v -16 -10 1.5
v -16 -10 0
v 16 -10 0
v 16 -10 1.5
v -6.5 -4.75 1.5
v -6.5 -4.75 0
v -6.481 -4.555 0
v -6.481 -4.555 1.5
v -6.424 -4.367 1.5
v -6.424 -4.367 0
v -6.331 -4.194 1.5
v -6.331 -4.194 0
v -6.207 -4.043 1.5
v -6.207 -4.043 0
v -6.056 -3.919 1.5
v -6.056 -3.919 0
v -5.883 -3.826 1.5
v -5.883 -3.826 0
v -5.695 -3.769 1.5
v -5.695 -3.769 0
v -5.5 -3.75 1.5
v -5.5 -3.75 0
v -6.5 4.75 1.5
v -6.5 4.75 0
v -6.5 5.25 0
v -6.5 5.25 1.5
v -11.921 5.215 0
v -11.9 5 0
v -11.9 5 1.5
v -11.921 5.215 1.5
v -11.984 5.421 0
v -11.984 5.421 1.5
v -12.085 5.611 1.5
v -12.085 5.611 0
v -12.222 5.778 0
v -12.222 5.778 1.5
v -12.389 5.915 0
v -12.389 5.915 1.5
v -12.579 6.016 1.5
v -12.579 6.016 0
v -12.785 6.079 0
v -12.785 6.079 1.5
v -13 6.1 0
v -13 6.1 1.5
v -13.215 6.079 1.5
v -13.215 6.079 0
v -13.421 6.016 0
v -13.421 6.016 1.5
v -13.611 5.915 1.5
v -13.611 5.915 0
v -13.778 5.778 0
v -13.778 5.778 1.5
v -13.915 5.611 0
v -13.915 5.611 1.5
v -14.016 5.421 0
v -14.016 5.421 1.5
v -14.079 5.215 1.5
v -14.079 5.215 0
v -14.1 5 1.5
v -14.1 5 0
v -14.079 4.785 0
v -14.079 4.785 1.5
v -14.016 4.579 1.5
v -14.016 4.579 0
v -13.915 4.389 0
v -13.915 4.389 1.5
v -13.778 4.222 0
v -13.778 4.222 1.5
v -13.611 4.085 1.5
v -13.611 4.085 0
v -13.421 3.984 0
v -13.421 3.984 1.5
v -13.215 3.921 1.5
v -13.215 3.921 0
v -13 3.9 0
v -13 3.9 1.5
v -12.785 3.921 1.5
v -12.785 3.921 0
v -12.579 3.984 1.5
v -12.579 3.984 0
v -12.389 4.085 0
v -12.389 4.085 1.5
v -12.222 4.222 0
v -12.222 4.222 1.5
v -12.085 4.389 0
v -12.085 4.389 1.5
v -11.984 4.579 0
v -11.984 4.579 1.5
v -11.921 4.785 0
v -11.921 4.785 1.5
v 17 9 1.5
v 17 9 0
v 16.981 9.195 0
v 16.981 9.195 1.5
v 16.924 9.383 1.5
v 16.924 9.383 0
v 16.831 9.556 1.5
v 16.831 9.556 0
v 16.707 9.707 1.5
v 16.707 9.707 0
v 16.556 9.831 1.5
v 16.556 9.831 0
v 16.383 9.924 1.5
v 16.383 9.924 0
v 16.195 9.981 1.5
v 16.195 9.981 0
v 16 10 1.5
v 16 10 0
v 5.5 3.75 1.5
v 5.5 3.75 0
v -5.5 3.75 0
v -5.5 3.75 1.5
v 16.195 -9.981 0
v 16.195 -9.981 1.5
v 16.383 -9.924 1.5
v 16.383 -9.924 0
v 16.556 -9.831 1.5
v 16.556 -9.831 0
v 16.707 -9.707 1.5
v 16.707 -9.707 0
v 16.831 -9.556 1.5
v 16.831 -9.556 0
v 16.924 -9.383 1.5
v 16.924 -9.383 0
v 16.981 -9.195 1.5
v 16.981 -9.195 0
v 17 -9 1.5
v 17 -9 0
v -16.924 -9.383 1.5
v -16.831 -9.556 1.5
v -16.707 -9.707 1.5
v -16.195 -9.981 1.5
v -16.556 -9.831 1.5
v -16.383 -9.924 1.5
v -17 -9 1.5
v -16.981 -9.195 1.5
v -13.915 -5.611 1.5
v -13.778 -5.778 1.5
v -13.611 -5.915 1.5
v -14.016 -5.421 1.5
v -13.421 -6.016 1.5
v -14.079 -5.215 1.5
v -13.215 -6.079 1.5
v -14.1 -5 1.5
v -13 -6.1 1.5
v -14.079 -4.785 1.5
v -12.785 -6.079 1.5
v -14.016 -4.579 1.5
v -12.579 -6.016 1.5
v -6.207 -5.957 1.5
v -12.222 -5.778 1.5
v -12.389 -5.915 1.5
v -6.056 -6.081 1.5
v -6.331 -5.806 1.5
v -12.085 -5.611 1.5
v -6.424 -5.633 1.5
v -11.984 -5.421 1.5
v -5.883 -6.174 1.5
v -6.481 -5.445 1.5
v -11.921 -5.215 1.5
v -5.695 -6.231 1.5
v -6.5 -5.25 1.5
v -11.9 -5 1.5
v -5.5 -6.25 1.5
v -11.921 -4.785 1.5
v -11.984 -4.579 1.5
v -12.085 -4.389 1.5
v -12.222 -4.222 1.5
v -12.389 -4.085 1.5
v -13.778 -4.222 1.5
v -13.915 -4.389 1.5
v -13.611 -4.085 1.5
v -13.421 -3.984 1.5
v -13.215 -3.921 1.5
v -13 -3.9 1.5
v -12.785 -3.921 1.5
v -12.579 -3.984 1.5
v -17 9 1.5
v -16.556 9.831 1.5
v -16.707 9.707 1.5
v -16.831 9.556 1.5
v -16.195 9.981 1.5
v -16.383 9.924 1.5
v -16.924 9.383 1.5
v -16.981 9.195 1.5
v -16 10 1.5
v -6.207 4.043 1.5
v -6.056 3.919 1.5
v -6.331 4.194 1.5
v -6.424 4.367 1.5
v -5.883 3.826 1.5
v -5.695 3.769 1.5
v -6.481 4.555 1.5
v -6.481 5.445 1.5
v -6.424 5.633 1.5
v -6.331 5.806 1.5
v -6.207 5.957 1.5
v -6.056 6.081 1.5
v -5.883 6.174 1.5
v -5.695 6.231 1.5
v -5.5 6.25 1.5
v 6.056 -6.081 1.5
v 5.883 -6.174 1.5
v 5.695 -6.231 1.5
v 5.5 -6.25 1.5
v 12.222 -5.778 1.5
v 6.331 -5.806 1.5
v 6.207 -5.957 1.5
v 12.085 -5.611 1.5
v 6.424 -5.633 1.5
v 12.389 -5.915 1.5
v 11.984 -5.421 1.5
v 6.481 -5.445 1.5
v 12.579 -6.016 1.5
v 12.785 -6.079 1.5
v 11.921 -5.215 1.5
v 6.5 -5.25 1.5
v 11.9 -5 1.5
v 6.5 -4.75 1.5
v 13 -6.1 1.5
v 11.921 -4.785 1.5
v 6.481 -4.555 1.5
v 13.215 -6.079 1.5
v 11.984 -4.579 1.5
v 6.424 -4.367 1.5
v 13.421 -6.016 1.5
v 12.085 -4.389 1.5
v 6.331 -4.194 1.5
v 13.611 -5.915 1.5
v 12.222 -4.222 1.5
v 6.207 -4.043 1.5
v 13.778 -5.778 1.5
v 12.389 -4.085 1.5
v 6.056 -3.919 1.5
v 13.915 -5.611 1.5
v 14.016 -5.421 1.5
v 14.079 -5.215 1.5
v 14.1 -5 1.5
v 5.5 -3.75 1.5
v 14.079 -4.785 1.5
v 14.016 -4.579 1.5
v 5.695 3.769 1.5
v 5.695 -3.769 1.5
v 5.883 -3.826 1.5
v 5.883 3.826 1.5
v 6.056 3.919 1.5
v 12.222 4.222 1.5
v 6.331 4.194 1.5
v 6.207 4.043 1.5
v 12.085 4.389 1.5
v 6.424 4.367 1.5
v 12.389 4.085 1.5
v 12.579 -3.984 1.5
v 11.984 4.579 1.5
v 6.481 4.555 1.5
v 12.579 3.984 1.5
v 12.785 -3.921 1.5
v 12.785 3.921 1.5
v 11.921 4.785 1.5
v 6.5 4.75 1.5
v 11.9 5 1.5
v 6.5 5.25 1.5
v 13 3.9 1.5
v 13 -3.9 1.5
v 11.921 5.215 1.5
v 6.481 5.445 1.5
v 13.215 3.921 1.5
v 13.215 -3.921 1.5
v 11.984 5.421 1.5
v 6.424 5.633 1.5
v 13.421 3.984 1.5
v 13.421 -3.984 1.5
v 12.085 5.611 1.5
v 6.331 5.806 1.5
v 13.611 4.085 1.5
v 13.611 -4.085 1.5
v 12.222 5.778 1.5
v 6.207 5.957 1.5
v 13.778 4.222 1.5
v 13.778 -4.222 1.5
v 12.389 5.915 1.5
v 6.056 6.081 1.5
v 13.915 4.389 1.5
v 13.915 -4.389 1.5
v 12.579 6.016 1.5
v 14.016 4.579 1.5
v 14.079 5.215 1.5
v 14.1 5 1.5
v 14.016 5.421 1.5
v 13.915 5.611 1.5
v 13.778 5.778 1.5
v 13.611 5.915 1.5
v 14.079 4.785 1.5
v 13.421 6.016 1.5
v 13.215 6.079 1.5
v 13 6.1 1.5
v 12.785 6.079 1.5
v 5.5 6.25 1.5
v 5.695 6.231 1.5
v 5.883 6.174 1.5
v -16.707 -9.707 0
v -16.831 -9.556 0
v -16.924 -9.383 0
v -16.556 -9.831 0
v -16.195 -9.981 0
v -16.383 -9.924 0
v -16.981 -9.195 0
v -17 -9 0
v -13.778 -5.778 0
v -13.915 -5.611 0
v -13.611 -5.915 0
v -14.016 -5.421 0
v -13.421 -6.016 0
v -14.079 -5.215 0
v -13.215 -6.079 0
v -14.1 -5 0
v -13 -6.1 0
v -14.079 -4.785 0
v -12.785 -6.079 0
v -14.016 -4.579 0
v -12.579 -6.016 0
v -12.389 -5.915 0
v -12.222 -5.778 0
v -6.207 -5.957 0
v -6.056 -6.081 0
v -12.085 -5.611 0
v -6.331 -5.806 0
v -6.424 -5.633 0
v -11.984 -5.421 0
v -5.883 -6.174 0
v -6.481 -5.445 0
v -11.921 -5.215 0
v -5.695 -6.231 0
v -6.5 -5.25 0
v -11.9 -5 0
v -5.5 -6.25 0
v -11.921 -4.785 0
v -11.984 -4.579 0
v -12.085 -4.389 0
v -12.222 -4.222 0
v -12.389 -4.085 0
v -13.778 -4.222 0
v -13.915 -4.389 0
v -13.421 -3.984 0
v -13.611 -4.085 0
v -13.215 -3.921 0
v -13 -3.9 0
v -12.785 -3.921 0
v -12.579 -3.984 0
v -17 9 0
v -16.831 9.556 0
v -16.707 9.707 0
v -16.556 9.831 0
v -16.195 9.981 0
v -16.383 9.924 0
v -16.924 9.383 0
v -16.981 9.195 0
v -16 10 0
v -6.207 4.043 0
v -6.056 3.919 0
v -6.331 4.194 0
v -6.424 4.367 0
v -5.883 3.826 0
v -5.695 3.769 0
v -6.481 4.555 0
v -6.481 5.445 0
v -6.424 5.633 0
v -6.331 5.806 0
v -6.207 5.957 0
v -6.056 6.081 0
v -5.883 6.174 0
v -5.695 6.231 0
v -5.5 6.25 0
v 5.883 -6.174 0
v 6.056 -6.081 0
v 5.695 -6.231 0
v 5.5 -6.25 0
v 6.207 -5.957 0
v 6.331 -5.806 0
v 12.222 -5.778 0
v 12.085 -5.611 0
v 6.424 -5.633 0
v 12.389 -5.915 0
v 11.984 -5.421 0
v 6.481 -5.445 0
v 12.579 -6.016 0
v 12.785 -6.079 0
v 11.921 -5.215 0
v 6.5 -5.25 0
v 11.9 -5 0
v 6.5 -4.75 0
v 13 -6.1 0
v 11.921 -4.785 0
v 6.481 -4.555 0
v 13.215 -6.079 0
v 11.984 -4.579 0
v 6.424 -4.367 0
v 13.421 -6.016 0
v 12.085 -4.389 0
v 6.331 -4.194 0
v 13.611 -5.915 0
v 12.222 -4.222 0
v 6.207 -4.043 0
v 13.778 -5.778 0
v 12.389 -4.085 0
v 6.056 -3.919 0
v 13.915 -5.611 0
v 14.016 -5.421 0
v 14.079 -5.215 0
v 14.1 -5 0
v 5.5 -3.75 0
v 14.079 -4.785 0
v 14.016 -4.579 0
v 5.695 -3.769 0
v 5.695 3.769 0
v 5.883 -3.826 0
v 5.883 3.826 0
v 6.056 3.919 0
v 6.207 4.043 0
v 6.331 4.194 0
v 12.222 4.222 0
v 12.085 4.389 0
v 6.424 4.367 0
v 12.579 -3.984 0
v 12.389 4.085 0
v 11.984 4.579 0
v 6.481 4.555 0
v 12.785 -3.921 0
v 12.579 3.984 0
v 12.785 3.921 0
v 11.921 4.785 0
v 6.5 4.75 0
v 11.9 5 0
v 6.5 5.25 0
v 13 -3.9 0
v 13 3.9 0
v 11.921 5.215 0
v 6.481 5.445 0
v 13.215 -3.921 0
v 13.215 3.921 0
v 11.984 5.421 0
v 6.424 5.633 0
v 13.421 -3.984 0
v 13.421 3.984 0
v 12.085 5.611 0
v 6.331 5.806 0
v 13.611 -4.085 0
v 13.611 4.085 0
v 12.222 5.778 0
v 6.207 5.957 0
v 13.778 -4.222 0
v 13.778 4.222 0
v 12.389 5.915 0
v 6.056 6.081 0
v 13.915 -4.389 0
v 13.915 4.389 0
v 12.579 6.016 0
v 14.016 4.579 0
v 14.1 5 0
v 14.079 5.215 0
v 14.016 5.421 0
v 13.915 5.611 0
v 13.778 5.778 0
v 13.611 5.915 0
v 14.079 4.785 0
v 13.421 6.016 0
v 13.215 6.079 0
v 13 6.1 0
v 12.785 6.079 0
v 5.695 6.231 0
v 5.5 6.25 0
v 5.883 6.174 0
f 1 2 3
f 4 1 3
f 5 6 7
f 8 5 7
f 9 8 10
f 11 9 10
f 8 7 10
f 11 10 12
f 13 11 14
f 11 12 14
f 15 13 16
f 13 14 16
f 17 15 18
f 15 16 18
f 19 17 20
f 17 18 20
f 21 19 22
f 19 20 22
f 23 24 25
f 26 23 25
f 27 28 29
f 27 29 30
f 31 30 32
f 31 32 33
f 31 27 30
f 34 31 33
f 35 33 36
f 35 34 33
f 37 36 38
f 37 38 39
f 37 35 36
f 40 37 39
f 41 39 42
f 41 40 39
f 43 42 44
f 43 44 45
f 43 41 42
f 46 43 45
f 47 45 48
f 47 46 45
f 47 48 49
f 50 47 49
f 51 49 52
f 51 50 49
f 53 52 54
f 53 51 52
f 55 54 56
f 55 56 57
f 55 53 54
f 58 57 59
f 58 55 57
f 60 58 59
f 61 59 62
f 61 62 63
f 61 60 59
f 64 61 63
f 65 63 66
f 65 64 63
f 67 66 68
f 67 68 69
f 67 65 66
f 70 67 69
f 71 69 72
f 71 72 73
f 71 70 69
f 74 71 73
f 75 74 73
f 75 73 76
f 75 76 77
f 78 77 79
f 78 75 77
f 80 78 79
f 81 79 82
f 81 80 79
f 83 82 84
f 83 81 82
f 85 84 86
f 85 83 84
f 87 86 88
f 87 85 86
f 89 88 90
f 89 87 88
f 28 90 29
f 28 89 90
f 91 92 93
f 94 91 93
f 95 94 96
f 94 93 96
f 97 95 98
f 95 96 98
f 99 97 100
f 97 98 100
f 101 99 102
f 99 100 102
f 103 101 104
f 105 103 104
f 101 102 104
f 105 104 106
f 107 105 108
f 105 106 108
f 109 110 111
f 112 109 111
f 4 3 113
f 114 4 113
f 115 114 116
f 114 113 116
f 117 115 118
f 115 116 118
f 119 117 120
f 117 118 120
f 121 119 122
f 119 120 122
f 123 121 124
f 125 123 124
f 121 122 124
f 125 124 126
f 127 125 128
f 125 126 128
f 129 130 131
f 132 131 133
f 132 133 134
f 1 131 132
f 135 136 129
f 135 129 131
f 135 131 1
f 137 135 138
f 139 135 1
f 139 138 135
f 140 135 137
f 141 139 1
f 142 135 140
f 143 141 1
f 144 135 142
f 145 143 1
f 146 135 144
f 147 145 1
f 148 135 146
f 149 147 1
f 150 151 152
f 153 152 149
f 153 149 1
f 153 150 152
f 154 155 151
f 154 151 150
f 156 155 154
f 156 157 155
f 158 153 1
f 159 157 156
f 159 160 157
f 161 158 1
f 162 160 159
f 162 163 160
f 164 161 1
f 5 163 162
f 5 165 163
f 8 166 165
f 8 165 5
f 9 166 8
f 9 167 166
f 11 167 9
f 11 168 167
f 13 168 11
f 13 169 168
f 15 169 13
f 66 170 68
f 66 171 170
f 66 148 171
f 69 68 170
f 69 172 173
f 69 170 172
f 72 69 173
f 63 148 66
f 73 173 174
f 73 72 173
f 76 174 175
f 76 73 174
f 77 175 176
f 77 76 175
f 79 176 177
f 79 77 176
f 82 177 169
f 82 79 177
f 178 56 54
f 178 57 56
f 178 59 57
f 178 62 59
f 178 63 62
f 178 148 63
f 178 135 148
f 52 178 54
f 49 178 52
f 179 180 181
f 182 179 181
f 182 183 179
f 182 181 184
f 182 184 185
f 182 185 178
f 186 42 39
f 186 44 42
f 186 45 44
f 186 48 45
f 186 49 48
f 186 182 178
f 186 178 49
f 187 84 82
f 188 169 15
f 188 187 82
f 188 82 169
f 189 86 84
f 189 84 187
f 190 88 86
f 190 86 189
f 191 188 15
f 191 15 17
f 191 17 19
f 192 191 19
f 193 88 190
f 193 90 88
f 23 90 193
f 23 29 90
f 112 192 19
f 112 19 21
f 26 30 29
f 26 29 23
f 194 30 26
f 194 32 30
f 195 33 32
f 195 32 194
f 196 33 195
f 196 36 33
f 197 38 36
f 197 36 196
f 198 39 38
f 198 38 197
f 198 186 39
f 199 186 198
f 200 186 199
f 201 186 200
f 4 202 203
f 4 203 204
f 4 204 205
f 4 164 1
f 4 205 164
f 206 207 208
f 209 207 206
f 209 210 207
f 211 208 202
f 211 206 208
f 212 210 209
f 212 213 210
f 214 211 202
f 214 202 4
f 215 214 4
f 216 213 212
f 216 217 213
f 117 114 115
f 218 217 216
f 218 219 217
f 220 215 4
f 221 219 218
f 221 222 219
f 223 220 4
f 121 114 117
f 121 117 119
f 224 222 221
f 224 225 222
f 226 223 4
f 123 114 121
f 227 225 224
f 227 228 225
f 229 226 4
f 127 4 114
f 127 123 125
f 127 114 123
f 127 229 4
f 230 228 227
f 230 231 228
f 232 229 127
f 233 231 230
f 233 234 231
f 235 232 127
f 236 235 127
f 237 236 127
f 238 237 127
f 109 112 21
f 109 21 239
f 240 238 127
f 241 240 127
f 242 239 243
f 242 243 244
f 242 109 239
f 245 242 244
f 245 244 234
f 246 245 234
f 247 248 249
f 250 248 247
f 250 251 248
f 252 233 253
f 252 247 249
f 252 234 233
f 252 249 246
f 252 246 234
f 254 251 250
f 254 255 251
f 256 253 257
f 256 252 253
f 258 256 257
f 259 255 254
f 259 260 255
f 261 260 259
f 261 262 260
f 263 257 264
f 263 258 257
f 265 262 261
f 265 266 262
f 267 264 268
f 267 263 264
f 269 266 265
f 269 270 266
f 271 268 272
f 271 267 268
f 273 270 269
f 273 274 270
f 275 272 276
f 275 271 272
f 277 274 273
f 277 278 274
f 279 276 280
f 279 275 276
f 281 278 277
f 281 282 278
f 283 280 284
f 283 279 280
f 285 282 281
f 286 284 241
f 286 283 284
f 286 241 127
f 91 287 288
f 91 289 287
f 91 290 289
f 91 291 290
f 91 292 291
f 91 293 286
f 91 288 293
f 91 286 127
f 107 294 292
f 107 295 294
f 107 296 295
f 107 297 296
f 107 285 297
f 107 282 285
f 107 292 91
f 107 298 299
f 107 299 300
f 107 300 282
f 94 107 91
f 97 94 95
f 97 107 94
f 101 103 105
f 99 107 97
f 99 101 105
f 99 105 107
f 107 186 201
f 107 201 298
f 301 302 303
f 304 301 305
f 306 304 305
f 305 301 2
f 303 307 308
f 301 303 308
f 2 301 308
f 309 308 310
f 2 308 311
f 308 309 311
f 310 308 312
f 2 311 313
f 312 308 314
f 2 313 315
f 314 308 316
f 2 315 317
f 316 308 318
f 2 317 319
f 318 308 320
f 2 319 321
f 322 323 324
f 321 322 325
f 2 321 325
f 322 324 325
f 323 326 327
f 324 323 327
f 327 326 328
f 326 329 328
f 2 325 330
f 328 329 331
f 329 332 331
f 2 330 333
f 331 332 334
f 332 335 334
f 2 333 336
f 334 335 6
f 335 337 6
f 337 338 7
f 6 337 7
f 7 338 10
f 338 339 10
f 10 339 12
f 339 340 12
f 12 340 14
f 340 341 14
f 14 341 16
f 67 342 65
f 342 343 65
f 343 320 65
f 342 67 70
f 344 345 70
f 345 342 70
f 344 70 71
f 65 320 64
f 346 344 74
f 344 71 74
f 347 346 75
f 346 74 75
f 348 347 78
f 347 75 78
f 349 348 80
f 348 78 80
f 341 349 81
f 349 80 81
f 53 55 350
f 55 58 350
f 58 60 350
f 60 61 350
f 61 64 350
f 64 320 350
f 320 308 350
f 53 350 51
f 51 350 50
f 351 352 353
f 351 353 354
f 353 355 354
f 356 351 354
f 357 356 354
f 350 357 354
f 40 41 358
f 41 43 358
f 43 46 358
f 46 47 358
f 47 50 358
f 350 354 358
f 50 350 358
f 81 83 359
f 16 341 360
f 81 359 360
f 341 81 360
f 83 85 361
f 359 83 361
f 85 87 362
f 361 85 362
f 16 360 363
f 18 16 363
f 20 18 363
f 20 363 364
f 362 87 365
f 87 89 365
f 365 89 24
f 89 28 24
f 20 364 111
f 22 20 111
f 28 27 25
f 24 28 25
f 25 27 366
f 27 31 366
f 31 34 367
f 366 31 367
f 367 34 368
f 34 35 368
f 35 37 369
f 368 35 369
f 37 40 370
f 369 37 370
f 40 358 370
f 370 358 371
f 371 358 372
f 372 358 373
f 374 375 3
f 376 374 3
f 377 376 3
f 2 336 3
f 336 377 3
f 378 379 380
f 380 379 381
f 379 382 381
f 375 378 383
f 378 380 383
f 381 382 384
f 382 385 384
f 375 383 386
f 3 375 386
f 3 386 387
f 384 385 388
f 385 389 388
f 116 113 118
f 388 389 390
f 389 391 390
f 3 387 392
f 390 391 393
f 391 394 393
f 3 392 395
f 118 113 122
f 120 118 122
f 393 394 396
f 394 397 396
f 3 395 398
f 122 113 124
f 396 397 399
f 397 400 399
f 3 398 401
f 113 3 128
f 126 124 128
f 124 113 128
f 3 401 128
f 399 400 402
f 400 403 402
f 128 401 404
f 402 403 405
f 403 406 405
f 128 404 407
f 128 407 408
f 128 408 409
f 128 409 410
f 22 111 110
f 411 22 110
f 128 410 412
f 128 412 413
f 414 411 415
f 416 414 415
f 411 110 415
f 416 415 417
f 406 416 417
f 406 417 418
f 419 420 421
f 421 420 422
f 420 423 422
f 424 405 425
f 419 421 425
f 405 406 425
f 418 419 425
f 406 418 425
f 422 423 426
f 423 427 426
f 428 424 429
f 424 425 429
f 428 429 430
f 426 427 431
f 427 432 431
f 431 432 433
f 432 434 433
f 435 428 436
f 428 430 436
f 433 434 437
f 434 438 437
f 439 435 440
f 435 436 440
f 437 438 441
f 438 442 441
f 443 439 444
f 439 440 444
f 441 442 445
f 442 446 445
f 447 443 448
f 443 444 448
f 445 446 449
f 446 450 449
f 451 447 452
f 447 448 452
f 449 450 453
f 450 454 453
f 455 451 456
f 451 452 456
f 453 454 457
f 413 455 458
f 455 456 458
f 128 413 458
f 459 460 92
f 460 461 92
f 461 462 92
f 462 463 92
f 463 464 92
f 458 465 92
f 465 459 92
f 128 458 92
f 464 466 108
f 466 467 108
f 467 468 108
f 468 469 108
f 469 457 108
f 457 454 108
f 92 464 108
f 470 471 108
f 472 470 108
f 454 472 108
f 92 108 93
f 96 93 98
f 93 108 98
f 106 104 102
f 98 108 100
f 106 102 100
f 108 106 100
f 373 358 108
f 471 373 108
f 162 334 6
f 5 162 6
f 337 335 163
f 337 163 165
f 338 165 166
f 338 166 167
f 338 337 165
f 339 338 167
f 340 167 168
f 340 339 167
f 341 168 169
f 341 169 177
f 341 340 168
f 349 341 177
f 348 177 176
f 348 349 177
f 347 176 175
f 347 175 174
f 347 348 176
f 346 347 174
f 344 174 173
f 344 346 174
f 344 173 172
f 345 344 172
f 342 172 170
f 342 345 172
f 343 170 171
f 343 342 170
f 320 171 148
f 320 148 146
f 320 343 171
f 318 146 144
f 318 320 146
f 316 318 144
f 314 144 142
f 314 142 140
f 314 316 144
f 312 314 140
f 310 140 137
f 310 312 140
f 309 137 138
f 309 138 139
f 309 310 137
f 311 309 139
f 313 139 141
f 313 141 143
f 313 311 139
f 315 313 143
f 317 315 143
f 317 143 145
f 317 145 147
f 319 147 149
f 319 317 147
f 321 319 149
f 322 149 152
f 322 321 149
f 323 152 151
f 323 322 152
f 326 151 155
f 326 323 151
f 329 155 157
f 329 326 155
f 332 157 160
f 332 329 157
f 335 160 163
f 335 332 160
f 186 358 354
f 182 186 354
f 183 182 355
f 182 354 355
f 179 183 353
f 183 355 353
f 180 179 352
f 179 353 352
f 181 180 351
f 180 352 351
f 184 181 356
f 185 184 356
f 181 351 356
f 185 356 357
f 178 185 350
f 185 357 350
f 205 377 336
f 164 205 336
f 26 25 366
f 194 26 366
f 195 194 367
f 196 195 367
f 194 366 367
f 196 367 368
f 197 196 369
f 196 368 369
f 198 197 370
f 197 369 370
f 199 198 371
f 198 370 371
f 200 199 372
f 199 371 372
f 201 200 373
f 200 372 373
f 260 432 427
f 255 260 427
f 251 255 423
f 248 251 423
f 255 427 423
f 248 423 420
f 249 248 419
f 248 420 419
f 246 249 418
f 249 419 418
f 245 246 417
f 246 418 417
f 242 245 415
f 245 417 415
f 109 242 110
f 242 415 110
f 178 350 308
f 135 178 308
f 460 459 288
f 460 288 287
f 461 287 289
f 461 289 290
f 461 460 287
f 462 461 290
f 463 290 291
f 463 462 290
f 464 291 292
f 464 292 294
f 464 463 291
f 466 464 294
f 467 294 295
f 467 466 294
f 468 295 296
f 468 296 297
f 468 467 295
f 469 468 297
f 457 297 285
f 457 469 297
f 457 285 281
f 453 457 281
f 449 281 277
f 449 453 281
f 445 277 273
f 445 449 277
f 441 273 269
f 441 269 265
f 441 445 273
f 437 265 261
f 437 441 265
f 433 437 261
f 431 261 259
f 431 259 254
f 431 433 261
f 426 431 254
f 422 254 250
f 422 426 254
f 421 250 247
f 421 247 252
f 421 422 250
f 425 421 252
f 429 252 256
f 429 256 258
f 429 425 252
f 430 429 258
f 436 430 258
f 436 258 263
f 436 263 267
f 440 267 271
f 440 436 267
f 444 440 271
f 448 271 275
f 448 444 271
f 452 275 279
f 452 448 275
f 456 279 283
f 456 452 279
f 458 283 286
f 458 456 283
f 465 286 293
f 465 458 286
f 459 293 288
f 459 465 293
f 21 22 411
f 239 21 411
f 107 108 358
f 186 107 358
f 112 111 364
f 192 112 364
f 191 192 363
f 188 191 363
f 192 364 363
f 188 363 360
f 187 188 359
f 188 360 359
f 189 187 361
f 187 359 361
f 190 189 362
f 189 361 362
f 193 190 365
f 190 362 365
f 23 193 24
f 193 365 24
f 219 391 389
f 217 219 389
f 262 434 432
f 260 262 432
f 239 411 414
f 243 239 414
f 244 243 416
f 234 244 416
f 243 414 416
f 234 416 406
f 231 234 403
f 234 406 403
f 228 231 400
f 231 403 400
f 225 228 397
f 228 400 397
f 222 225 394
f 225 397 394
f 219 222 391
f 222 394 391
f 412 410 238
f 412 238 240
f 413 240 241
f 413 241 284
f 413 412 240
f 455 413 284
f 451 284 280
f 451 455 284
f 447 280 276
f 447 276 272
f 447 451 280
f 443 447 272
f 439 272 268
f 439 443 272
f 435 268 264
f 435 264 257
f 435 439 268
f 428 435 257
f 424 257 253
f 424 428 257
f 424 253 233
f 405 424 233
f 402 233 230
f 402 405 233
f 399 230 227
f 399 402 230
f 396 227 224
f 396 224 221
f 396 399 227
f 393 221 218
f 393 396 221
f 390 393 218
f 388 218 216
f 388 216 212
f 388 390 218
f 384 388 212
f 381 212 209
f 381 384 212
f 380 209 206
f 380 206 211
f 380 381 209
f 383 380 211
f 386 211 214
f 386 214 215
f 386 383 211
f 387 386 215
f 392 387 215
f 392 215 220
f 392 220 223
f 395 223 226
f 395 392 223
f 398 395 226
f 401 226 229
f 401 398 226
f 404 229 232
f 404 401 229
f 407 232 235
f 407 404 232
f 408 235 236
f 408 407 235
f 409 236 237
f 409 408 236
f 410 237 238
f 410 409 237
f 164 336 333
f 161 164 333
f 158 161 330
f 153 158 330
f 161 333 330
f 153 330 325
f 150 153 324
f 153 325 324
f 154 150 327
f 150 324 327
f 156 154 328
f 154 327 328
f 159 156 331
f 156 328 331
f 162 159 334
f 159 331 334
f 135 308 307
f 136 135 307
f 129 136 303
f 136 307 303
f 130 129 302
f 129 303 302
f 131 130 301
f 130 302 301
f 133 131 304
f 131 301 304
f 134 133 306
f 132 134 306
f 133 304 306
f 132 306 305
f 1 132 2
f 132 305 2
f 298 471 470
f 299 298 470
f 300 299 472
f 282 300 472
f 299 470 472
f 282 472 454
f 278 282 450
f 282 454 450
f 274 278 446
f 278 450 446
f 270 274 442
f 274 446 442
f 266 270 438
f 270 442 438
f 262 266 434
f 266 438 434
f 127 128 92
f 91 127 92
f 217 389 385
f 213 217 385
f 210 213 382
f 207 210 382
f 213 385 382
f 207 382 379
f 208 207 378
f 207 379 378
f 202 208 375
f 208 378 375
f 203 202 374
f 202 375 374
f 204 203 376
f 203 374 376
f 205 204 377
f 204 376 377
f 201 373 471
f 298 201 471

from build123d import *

# Parameters (mm, degrees)
F0_R     = 1.1
F1_DEPTH = 1.5


with BuildPart() as f1:
    # F0 (on Top) → F1 (new body)
    with BuildSketch(Plane.XY):
        with BuildLine():
            ThreePointArc((17, 9), (16.707107, 9.707107), (16, 10))
            Line((16, 10), (-16, 10))
            ThreePointArc((-16, 10), (-16.707107, 9.707107), (-17, 9))
            Line((-17, 9), (-17, -9))
            ThreePointArc((-17, -9), (-16.707107, -9.707107), (-16, -10))
            Line((-16, -10), (16, -10))
            ThreePointArc((16, -10), (16.707107, -9.707107), (17, -9))
            Line((17, -9), (17, 9))
        make_face()
        with Locations((-13, -5)):
            Circle(F0_R, mode=Mode.SUBTRACT)
        with BuildLine():
            ThreePointArc((-5.5, -6.25), (-6.207107, -5.957107), (-6.5, -5.25))
            Line((-6.5, -5.25), (-6.5, -4.75))
            ThreePointArc((-6.5, -4.75), (-6.207107, -4.042893), (-5.5, -3.75))
            Line((-5.5, -3.75), (5.5, -3.75))
            ThreePointArc((5.5, -3.75), (6.207107, -4.042893), (6.5, -4.75))
            Line((6.5, -4.75), (6.5, -5.25))
            ThreePointArc((6.5, -5.25), (6.207107, -5.957107), (5.5, -6.25))
            Line((5.5, -6.25), (-5.5, -6.25))
        make_face(mode=Mode.SUBTRACT)
        with Locations((13, -5)):
            Circle(F0_R, mode=Mode.SUBTRACT)
        with Locations((-13, 5)):
            Circle(F0_R, mode=Mode.SUBTRACT)
        with BuildLine():
            ThreePointArc((-6.5, 5.25), (-6.207107, 5.957107), (-5.5, 6.25))
            Line((-5.5, 6.25), (5.5, 6.25))
            ThreePointArc((5.5, 6.25), (6.207107, 5.957107), (6.5, 5.25))
            Line((6.5, 5.25), (6.5, 4.75))
            ThreePointArc((6.5, 4.75), (6.207107, 4.042893), (5.5, 3.75))
            Line((5.5, 3.75), (-5.5, 3.75))
            ThreePointArc((-5.5, 3.75), (-6.207107, 4.042893), (-6.5, 4.75))
            Line((-6.5, 4.75), (-6.5, 5.25))
        make_face(mode=Mode.SUBTRACT)
        with Locations((13, 5)):
            Circle(F0_R, mode=Mode.SUBTRACT)
    extrude(amount=F1_DEPTH)


solid = f1.part
